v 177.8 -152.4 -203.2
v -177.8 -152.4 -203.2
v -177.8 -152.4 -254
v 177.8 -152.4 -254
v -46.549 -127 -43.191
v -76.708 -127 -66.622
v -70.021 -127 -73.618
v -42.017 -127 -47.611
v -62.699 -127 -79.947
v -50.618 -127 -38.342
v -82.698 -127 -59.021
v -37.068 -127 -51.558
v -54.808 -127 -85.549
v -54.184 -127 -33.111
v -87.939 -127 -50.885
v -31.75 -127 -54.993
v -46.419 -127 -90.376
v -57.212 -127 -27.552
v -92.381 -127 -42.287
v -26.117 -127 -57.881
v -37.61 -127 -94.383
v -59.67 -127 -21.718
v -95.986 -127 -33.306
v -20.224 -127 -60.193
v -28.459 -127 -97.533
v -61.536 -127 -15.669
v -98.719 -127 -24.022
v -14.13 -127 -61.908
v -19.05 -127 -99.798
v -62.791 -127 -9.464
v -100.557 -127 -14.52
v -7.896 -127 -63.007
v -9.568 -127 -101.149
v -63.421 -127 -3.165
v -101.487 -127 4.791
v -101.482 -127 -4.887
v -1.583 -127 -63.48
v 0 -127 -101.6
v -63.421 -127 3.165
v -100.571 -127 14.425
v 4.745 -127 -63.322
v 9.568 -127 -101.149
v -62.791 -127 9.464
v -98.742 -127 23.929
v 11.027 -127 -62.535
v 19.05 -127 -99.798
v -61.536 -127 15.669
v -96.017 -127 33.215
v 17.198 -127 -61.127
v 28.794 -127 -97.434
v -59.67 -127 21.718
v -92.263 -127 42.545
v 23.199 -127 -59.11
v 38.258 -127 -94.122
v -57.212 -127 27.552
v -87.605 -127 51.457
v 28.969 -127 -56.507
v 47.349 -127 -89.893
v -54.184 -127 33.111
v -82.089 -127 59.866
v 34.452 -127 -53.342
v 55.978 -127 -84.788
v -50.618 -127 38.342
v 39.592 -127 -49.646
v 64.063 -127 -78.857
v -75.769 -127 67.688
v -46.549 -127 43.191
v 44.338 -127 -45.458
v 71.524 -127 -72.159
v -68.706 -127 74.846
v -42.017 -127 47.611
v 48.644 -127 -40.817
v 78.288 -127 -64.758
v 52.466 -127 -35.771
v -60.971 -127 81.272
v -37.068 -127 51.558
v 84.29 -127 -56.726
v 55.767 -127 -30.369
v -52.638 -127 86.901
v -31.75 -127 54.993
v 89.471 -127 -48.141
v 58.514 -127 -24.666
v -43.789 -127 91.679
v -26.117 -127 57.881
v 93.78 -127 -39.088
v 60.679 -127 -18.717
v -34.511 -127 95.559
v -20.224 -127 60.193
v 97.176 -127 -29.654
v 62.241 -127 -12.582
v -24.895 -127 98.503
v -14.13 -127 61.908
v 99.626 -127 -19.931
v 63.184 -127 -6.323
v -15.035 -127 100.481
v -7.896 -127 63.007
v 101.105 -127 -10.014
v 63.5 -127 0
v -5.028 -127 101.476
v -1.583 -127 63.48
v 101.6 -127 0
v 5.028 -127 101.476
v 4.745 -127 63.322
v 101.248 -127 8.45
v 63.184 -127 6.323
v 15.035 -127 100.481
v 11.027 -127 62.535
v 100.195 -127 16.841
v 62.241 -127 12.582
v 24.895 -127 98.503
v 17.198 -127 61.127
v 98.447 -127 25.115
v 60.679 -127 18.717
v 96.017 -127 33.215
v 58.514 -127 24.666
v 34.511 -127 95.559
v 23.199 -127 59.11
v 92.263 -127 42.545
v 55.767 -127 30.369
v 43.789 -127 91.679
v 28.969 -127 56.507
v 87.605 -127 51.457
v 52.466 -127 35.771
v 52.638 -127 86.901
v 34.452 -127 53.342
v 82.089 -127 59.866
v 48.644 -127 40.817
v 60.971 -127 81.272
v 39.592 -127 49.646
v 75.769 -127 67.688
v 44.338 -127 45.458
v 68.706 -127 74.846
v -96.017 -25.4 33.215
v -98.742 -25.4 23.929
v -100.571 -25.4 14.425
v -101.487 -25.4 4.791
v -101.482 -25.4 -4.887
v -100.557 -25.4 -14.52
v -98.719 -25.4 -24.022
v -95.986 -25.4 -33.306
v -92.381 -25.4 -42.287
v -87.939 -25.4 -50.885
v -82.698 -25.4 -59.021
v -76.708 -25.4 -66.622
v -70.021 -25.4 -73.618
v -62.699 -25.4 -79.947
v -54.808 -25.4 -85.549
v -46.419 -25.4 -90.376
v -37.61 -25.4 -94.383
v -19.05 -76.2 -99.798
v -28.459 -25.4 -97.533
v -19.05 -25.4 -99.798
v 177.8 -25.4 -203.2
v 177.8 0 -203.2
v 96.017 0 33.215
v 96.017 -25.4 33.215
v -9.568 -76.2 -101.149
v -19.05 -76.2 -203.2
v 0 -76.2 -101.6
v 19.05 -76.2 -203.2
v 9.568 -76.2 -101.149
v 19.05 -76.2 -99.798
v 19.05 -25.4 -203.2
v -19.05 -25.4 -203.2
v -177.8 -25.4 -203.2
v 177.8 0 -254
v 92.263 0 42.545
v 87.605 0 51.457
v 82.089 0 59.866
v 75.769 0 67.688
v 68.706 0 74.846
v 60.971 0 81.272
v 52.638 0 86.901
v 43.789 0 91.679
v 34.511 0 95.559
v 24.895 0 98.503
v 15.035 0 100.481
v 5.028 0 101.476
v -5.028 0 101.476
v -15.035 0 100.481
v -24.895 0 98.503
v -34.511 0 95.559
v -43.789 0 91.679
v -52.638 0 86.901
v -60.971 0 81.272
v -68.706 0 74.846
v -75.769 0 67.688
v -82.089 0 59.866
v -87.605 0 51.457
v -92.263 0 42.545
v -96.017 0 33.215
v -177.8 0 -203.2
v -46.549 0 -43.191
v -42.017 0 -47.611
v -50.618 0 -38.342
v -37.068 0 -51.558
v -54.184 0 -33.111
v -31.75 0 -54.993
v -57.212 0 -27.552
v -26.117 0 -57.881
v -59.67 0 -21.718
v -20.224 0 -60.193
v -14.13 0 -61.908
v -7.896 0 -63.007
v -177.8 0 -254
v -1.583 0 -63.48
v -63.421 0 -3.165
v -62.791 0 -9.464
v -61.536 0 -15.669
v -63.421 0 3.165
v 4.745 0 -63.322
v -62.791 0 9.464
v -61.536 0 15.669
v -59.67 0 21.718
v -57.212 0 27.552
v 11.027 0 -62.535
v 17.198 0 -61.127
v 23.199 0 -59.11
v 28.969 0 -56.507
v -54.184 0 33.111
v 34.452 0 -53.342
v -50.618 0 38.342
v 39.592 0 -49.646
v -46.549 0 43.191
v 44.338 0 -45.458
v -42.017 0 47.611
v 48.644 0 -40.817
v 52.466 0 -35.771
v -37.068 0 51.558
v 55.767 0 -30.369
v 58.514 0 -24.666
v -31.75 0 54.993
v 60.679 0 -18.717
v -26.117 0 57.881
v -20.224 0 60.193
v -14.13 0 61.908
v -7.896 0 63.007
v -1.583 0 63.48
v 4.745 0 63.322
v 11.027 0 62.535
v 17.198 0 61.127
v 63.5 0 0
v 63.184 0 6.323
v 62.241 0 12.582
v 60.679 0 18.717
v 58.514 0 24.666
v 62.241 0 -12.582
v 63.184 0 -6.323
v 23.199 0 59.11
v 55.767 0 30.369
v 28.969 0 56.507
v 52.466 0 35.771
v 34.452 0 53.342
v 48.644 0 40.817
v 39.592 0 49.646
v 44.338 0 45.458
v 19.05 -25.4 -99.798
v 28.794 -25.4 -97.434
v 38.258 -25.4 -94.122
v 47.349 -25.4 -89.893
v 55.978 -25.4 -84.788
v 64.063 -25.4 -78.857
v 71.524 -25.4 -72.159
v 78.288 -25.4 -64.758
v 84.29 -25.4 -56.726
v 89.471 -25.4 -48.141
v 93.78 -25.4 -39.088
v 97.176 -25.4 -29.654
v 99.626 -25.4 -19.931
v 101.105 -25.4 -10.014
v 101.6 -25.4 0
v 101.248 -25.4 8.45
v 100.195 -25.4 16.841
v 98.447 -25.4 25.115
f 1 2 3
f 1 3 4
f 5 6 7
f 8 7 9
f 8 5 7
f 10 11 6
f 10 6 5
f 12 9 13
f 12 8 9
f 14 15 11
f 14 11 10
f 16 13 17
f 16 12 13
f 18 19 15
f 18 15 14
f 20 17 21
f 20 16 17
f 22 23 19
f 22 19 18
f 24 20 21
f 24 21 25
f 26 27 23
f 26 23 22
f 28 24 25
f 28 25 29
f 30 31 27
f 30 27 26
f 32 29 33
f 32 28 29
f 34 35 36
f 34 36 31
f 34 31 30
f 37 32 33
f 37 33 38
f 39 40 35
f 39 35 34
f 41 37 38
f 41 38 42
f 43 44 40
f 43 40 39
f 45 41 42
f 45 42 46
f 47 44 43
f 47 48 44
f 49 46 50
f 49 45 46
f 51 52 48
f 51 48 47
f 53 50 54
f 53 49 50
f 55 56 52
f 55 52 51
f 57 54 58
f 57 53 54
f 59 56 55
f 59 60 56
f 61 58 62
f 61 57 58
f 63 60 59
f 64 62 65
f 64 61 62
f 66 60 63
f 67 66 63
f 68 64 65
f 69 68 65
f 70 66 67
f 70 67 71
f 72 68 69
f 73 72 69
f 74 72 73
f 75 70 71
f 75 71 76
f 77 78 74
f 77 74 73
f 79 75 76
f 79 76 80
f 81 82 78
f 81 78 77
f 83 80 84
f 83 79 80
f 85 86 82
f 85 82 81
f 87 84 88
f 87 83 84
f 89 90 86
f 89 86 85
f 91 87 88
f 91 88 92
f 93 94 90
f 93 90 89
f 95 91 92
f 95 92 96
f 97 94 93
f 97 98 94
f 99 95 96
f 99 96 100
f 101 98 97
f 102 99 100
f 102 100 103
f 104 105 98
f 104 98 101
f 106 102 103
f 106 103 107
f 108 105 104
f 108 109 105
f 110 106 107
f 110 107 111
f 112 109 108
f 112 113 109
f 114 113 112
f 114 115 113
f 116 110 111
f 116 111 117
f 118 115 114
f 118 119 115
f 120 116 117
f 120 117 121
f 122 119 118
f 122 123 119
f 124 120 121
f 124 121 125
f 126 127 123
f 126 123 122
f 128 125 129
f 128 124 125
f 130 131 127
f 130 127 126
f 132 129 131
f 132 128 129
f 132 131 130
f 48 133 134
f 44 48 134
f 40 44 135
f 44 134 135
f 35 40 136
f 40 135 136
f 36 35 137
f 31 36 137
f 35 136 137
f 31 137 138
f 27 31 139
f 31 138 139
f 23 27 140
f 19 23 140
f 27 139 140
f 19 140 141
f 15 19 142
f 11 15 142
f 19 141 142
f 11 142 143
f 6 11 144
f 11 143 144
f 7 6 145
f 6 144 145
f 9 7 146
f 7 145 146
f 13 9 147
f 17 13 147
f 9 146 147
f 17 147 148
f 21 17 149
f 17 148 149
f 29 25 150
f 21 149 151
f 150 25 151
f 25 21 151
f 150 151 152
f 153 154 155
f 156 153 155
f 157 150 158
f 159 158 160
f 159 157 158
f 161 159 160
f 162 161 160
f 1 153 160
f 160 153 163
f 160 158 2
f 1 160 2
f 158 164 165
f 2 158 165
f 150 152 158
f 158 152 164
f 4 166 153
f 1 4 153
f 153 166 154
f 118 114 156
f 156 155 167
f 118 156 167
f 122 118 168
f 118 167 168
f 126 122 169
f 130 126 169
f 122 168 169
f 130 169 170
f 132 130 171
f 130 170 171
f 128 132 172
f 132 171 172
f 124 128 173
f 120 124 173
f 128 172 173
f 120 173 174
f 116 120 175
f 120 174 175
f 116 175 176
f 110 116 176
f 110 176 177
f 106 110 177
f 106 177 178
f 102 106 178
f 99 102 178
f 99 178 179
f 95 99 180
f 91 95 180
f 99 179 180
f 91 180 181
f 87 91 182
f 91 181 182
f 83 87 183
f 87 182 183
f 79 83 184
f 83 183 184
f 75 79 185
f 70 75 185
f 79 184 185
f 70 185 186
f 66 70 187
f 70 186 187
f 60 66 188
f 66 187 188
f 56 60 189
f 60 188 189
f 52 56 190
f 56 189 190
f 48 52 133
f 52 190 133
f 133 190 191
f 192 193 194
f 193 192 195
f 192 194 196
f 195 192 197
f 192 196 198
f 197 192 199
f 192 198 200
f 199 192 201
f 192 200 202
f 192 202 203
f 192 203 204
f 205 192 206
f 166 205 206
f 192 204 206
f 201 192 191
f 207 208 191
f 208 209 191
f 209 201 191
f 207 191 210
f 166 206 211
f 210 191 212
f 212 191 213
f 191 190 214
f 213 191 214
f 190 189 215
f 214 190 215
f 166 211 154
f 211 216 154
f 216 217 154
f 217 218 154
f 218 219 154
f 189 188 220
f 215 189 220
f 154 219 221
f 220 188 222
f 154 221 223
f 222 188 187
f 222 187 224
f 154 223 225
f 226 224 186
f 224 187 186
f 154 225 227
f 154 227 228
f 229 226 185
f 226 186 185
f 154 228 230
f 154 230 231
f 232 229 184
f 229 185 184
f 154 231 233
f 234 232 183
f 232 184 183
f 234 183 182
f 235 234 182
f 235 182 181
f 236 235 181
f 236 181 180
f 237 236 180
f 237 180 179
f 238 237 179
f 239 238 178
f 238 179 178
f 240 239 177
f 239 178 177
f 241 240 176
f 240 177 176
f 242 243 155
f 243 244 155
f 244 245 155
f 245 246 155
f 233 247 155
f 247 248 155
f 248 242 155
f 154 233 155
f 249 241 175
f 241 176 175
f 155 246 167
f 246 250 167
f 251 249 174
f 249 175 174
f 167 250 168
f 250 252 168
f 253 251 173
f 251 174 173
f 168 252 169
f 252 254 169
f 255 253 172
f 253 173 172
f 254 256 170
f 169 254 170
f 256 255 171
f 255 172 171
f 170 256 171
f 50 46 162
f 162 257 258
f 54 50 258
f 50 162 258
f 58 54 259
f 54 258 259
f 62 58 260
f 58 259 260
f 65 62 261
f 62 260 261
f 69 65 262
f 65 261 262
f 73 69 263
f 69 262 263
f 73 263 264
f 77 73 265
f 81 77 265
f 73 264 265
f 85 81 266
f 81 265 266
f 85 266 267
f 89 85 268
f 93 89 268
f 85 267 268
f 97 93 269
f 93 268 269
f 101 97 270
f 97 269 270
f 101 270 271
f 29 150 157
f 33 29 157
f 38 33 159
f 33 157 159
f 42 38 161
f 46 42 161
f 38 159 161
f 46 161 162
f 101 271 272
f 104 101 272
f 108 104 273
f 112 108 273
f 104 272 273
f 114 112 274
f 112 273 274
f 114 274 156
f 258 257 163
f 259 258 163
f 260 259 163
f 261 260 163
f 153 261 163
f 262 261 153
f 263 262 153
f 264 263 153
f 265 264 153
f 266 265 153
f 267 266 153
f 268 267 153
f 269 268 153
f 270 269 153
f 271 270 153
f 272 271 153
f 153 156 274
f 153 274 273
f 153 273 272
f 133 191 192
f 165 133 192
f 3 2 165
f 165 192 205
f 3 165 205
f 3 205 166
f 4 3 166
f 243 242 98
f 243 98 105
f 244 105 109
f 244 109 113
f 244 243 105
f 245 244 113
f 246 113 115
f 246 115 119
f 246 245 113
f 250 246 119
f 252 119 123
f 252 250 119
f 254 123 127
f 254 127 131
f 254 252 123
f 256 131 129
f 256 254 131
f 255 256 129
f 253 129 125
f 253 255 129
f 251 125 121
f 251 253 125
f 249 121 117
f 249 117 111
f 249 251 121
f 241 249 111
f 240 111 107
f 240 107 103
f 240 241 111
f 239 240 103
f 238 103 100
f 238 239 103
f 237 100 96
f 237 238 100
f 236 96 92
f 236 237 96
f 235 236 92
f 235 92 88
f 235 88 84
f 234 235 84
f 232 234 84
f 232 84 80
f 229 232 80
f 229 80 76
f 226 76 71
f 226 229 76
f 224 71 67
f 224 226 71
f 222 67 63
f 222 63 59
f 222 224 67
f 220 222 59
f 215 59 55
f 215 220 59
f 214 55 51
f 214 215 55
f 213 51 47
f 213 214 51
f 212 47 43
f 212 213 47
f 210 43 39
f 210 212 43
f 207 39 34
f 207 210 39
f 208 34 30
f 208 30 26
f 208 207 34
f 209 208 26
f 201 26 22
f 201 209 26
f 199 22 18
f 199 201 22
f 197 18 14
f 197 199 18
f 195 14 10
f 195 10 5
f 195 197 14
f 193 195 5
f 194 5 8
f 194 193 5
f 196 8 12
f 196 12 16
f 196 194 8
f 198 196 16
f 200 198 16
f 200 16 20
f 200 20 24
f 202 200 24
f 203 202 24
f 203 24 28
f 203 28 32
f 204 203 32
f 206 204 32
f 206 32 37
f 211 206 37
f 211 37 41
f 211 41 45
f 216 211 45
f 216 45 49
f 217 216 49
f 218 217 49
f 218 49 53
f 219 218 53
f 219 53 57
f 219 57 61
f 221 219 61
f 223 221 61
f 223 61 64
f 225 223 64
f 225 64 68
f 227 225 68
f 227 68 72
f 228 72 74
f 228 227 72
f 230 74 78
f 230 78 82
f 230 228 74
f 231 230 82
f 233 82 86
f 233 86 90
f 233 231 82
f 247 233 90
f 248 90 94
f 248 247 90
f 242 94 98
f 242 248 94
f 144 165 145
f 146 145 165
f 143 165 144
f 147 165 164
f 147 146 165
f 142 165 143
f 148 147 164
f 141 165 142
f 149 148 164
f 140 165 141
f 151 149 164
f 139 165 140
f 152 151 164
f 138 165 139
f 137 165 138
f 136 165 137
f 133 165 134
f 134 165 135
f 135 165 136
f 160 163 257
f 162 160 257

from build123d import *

# Parameters (mm, degrees)
F0_R     = 63.5
F1_DEPTH = 127
F2_DEPTH = 152.4
F3_DEPTH = 76.2
F4_DEPTH = 25.4


with BuildPart() as f1:
    # F0 (on Front) → F1 (new body)
    with BuildSketch(Plane.XZ):
        with BuildLine():
            ThreePointArc((19.05, -99.798084), (78.288058, -64.757548), (101.6, 0))
            ThreePointArc((101.6, 0), (100.194597, 16.840506), (96.017271, 33.215112))
            ThreePointArc((96.017271, 33.215112), (0, 101.6), (-96.017271, 33.215112))
            ThreePointArc((-96.017271, 33.215112), (-87.938881, -50.885295), (-19.05, -99.798084))
            ThreePointArc((-19.05, -99.798084), (0, -101.6), (19.05, -99.798084))
        make_face()
        Circle(F0_R, mode=Mode.SUBTRACT)
    extrude(amount=F1_DEPTH)



with BuildPart() as f2:
    # F0 (on Front) → F2 (new body)
    with BuildSketch(Plane.XZ):
        Polygon((177.8, -254), (177.8, -203.2), (19.05, -203.2), (-19.05, -203.2), (-177.8, -203.2), (-177.8, -254), align=None)
    extrude(amount=F2_DEPTH)


with BuildPart() as f1_1:
    add(f1.part)

    add(f2.part)  # F3 merges F2
    # F0 (on Front) → F3 (join)
    with BuildSketch(Plane.XZ):
        with BuildLine():
            Line((19.05, -203.2), (19.05, -99.798084))
            ThreePointArc((19.05, -99.798084), (0, -101.6), (-19.05, -99.798084))
            Line((-19.05, -99.798084), (-19.05, -203.2))
            Line((-19.05, -203.2), (19.05, -203.2))
        make_face()
    extrude(amount=F3_DEPTH)

    # F0 (on Front) → F4 (join)
    with BuildSketch(Plane.XZ):
        with BuildLine():
            ThreePointArc((-19.05, -99.798084), (-87.938881, -50.885295), (-96.017271, 33.215112))
            Line((-96.017271, 33.215112), (-177.8, -203.2))
            Line((-177.8, -203.2), (-19.05, -203.2))
            Line((-19.05, -203.2), (-19.05, -99.798084))
        make_face()
        with BuildLine():
            ThreePointArc((96.017271, 33.215112), (100.194597, 16.840506), (101.6, 0))
            ThreePointArc((101.6, 0), (78.288058, -64.757548), (19.05, -99.798084))
            Line((19.05, -99.798084), (19.05, -203.2))
            Line((19.05, -203.2), (177.8, -203.2))
            Line((177.8, -203.2), (96.017271, 33.215112))
        make_face()
    extrude(amount=F4_DEPTH)


solid = f1_1.part
